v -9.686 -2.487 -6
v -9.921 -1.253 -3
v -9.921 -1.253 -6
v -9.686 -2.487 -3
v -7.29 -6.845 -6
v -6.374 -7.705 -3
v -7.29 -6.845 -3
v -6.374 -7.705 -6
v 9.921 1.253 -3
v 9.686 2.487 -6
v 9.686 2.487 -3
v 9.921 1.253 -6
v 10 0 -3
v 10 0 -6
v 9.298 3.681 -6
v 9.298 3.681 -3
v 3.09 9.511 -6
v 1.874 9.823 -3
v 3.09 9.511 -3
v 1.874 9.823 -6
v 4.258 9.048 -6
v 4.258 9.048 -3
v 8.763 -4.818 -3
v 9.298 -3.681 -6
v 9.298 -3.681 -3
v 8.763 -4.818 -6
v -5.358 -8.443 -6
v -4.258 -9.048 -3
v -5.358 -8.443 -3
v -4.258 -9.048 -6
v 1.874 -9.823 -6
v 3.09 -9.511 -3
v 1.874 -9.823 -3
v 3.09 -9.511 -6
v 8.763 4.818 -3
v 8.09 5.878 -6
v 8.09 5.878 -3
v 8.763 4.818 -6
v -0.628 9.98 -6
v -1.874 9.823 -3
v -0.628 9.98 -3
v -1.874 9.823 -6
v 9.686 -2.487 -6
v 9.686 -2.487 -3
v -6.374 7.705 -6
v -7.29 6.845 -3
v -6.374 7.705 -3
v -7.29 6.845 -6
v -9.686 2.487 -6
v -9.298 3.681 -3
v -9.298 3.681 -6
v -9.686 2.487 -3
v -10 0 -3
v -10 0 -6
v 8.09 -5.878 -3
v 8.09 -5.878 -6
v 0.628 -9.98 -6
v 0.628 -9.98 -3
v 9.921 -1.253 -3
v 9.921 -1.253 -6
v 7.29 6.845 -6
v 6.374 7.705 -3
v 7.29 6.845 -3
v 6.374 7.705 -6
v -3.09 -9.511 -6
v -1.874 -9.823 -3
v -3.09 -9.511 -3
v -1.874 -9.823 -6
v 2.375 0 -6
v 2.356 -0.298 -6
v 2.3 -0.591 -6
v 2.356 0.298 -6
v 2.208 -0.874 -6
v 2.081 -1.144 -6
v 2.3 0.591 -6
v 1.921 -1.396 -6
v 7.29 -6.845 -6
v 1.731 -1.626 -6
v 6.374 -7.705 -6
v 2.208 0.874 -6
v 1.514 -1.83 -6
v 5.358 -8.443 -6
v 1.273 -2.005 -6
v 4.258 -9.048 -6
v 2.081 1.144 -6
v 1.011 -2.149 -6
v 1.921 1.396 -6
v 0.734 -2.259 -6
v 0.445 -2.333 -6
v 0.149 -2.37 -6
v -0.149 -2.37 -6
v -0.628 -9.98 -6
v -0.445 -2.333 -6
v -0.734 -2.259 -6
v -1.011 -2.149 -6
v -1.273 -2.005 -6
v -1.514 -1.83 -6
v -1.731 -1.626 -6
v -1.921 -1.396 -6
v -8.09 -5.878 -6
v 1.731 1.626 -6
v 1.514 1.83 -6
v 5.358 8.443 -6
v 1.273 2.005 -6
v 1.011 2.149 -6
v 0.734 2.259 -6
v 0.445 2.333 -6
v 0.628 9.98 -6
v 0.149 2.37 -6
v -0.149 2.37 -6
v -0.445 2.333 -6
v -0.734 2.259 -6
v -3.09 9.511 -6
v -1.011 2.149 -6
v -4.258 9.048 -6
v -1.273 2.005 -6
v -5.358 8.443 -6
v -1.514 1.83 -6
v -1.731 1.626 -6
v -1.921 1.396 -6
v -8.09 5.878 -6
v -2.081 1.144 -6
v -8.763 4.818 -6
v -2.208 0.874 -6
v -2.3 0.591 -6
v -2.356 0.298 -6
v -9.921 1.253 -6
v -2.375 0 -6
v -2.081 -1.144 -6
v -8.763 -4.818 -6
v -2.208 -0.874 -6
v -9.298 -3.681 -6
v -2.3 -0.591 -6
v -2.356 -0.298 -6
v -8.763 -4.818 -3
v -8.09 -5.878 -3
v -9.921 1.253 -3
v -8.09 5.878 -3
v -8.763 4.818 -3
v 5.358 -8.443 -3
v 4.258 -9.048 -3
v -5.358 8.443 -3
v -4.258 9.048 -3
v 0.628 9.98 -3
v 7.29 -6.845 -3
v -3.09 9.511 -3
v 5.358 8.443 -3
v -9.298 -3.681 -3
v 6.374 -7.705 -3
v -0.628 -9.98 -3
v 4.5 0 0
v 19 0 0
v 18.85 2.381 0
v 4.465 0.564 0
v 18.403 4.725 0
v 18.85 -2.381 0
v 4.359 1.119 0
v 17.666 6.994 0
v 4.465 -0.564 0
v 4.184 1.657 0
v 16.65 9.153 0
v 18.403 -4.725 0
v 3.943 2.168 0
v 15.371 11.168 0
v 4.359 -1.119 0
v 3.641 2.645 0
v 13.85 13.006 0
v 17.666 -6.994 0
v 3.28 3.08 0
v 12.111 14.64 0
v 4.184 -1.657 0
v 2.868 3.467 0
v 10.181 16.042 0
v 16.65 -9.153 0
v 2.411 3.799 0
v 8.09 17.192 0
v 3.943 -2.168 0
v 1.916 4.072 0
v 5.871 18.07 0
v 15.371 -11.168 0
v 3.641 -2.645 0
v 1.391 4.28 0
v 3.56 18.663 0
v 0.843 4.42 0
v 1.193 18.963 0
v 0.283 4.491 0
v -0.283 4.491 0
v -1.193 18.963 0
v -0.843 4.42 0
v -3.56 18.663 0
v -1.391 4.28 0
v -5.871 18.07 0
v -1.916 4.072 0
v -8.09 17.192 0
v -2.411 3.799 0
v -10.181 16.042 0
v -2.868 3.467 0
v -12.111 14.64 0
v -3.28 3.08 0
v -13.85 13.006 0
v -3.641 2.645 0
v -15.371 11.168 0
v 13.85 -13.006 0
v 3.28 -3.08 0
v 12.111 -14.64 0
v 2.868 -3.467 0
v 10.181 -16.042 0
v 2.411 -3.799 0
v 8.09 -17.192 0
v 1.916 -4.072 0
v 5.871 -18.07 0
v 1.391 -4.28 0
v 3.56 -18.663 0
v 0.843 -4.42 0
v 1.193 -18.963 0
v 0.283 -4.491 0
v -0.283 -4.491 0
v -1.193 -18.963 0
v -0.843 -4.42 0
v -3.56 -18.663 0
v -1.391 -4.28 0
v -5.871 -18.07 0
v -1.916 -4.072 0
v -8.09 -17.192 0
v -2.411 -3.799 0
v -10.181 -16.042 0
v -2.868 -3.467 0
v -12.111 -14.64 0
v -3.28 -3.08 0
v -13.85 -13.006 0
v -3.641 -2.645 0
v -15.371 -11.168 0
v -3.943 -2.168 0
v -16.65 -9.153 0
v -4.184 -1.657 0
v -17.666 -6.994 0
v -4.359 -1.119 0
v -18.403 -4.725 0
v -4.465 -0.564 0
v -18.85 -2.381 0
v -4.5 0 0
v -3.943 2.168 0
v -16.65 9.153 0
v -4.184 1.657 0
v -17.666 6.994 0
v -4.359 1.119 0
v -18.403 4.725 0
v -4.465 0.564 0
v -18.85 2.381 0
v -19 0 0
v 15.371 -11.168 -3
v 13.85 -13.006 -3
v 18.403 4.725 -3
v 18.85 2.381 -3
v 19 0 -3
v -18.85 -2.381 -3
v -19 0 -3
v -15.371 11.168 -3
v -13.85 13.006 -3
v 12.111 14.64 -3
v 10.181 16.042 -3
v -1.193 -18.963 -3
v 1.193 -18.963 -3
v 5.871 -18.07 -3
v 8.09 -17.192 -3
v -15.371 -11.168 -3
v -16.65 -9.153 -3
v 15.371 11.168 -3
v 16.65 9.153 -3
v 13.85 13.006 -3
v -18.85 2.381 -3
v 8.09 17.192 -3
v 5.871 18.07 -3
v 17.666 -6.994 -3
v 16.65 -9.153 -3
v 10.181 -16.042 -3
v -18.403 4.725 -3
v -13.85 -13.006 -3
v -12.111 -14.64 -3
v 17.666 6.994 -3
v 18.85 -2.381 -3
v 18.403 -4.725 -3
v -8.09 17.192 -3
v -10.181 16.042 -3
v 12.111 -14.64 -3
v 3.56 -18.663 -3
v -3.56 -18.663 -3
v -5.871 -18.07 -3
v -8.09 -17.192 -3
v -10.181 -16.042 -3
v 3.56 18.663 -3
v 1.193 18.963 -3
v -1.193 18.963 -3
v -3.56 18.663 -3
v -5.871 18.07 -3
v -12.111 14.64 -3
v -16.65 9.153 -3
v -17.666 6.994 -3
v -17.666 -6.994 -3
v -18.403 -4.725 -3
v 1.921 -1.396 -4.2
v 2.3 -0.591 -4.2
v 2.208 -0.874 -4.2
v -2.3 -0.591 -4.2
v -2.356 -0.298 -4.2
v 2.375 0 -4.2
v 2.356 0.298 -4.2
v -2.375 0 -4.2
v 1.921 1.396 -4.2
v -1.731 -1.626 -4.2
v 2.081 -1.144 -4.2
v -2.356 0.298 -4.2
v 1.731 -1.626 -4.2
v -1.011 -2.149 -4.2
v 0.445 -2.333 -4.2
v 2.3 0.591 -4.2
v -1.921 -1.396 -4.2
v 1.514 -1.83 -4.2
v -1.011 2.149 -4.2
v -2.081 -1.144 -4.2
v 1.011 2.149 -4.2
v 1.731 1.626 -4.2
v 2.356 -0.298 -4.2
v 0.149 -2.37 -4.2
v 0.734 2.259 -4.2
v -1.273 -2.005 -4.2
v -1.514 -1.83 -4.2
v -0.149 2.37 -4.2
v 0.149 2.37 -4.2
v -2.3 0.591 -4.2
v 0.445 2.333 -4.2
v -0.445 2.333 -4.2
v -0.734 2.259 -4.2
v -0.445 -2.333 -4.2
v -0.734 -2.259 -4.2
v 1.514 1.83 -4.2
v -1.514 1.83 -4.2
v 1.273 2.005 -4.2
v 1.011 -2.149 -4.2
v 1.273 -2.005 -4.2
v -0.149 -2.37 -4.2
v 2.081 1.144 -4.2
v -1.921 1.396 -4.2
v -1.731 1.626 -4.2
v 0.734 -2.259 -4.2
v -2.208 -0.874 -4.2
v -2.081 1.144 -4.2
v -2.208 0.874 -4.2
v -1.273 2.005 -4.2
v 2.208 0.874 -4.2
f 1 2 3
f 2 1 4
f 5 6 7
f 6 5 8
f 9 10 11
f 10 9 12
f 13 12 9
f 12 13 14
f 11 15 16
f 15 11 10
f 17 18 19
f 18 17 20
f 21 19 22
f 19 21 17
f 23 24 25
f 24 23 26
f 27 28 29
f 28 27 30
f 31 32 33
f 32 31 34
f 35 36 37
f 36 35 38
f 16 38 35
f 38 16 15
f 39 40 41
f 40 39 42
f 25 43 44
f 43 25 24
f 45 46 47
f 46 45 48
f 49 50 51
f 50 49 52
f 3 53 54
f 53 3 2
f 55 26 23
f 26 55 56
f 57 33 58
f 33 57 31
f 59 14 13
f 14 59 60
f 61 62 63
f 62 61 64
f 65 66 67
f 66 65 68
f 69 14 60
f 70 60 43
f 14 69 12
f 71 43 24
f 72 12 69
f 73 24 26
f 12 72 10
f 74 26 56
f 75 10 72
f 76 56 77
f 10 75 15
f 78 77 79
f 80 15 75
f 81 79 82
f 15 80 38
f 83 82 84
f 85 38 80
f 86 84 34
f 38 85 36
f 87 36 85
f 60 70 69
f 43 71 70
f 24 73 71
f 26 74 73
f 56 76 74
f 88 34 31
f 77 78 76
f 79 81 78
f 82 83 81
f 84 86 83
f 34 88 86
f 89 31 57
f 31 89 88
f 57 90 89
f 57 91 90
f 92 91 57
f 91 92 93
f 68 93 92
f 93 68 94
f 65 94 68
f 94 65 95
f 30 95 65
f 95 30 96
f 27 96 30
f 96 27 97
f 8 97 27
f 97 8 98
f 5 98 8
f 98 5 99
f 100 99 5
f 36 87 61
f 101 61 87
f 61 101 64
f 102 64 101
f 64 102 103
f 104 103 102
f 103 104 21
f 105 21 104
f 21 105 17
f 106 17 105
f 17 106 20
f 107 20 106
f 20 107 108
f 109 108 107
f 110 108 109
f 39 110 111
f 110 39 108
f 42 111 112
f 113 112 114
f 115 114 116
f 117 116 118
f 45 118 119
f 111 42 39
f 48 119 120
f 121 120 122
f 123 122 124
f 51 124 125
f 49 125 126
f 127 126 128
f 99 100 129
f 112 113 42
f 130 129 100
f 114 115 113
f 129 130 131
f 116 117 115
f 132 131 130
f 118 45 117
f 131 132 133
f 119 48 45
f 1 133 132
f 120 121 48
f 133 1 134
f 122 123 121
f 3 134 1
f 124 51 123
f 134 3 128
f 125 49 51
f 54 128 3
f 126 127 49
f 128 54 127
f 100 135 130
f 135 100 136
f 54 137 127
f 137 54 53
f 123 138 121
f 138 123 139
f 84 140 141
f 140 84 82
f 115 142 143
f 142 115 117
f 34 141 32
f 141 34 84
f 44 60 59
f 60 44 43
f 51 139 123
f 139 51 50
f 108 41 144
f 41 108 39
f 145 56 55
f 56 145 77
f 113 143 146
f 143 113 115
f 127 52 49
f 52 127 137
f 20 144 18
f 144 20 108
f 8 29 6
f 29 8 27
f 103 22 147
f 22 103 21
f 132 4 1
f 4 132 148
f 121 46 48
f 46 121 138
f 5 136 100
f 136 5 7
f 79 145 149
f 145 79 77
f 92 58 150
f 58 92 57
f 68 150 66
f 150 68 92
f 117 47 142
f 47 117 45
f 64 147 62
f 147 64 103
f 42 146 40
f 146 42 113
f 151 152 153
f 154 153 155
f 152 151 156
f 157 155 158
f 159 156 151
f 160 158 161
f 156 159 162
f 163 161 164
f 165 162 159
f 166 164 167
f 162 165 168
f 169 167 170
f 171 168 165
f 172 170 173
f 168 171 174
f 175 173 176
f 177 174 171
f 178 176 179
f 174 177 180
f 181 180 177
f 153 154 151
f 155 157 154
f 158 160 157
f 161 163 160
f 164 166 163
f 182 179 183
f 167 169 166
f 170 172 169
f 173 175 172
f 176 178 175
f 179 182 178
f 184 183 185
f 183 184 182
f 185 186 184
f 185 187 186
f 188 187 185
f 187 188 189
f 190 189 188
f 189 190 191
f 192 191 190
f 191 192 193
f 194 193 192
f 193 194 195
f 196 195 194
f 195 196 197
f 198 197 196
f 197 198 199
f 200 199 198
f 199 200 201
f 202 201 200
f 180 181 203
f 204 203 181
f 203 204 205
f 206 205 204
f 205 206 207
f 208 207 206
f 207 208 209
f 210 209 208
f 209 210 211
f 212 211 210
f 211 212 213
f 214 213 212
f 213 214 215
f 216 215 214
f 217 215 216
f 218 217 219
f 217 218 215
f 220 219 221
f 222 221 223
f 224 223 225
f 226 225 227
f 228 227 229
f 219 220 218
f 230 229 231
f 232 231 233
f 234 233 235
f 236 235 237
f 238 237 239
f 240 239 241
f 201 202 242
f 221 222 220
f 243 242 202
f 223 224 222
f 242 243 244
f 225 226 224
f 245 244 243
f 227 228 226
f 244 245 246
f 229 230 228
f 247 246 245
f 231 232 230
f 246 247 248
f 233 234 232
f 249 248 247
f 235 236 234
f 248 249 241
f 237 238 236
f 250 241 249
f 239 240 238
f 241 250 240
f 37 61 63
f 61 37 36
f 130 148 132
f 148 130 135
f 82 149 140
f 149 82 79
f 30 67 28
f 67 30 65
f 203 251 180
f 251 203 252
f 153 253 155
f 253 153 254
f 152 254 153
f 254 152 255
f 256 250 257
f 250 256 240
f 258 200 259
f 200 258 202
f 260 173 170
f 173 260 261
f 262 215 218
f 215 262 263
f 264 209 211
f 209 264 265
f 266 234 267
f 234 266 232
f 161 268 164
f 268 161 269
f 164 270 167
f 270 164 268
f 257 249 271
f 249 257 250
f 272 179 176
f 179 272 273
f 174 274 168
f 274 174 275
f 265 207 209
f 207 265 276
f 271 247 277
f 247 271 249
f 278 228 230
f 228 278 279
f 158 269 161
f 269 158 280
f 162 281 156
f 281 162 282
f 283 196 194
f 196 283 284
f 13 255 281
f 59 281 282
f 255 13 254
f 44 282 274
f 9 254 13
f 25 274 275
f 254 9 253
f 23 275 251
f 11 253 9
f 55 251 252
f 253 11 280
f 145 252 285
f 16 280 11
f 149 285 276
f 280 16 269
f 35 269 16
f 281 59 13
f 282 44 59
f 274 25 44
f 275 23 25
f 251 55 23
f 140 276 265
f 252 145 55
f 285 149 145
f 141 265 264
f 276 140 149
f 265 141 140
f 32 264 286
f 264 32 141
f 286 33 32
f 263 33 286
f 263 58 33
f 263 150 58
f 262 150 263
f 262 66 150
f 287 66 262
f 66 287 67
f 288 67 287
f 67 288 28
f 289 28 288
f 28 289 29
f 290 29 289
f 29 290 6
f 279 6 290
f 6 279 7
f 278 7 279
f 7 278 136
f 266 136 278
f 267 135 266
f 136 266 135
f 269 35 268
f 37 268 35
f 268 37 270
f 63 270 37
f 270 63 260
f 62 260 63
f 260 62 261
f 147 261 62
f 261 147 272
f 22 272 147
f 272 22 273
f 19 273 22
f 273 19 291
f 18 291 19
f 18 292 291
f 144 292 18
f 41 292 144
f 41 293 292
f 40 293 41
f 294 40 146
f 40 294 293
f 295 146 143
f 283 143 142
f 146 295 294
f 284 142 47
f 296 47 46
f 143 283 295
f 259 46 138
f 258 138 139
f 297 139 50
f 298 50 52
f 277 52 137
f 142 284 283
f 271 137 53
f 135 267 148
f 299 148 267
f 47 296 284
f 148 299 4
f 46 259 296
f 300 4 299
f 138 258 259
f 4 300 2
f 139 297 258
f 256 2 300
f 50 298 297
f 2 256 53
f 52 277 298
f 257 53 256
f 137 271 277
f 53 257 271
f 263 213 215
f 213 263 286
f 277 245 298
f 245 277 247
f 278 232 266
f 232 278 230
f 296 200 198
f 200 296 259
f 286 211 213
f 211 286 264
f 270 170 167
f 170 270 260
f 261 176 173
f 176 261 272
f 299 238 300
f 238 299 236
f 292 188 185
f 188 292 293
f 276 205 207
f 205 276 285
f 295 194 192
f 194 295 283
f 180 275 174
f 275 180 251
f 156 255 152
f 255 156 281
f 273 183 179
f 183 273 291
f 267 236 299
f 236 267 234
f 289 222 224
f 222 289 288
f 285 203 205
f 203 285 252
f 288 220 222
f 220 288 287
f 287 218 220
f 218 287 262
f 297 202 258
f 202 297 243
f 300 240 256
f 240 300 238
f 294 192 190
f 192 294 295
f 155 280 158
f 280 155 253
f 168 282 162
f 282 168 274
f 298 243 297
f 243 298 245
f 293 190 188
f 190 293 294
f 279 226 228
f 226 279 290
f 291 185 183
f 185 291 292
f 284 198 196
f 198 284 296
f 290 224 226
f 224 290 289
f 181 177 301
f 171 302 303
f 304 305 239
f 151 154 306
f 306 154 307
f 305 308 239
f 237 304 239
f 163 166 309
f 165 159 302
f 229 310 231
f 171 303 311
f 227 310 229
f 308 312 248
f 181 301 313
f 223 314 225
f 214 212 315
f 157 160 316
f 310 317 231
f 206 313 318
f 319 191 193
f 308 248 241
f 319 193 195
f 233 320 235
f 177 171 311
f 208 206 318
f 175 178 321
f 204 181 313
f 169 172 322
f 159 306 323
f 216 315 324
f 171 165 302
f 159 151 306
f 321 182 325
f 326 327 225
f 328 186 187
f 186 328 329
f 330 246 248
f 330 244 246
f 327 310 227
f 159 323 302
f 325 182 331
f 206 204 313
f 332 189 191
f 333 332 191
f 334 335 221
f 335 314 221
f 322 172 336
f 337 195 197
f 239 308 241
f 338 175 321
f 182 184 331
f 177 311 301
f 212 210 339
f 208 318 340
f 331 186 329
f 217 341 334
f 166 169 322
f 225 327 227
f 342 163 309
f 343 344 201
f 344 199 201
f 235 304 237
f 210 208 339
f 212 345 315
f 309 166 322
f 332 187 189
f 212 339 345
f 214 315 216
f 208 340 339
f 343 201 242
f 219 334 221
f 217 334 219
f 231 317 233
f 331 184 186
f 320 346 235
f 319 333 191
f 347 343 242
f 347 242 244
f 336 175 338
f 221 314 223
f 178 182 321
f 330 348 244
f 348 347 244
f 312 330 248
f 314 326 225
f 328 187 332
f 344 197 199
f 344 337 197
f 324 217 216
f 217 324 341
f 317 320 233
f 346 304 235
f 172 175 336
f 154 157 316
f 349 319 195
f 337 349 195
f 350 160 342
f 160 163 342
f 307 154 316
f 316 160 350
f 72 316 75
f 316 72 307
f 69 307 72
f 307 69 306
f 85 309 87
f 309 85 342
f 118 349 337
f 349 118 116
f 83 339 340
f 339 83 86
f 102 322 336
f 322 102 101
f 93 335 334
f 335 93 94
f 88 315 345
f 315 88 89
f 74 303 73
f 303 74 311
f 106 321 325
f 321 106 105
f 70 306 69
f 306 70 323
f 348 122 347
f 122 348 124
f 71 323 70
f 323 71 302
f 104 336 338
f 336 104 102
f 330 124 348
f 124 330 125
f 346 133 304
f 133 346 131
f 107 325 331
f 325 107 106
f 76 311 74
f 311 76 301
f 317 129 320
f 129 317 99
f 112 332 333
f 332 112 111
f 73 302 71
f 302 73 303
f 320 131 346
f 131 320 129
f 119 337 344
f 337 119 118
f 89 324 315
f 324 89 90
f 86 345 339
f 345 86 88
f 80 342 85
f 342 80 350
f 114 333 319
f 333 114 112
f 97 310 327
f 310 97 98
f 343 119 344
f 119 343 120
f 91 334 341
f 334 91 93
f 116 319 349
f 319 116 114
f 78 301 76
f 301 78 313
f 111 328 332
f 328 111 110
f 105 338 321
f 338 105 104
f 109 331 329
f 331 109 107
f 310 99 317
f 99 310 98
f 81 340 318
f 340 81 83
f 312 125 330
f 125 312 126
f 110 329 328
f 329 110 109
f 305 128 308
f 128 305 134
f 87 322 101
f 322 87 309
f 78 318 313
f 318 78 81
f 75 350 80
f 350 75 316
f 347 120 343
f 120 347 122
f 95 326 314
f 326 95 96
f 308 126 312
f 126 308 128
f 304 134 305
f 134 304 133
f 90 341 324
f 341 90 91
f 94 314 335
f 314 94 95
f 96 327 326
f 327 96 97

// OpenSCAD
$fn = 50;


difference() {
	union() {
		translate(v = [0, 0, -6.0000000000]) {
			cylinder(h = 6, r = 10.0000000000);
		}
		translate(v = [0, 0, -3.0000000000]) {
			cylinder(h = 3, r = 19.0000000000);
		}
	}
	union() {
		translate(v = [0, 0, 0]) {
			rotate(a = [0, 0, 0]) {
				difference() {
					union() {
						#translate(v = [0, 0, -6.0000000000]) {
							cylinder(h = 6, r = 2.2500000000);
						}
						#translate(v = [0, 0, -4.2000000000]) {
							cylinder(h = 4.2000000000, r1 = 2.3750000000, r2 = 4.5000000000);
						}
						#translate(v = [0, 0, -6.0000000000]) {
							cylinder(h = 6, r = 2.3750000000);
						}
						#translate(v = [0, 0, -6.0000000000]) {
							cylinder(h = 6, r = 2.2500000000);
						}
					}
					union();
				}
			}
		}
	}
}
